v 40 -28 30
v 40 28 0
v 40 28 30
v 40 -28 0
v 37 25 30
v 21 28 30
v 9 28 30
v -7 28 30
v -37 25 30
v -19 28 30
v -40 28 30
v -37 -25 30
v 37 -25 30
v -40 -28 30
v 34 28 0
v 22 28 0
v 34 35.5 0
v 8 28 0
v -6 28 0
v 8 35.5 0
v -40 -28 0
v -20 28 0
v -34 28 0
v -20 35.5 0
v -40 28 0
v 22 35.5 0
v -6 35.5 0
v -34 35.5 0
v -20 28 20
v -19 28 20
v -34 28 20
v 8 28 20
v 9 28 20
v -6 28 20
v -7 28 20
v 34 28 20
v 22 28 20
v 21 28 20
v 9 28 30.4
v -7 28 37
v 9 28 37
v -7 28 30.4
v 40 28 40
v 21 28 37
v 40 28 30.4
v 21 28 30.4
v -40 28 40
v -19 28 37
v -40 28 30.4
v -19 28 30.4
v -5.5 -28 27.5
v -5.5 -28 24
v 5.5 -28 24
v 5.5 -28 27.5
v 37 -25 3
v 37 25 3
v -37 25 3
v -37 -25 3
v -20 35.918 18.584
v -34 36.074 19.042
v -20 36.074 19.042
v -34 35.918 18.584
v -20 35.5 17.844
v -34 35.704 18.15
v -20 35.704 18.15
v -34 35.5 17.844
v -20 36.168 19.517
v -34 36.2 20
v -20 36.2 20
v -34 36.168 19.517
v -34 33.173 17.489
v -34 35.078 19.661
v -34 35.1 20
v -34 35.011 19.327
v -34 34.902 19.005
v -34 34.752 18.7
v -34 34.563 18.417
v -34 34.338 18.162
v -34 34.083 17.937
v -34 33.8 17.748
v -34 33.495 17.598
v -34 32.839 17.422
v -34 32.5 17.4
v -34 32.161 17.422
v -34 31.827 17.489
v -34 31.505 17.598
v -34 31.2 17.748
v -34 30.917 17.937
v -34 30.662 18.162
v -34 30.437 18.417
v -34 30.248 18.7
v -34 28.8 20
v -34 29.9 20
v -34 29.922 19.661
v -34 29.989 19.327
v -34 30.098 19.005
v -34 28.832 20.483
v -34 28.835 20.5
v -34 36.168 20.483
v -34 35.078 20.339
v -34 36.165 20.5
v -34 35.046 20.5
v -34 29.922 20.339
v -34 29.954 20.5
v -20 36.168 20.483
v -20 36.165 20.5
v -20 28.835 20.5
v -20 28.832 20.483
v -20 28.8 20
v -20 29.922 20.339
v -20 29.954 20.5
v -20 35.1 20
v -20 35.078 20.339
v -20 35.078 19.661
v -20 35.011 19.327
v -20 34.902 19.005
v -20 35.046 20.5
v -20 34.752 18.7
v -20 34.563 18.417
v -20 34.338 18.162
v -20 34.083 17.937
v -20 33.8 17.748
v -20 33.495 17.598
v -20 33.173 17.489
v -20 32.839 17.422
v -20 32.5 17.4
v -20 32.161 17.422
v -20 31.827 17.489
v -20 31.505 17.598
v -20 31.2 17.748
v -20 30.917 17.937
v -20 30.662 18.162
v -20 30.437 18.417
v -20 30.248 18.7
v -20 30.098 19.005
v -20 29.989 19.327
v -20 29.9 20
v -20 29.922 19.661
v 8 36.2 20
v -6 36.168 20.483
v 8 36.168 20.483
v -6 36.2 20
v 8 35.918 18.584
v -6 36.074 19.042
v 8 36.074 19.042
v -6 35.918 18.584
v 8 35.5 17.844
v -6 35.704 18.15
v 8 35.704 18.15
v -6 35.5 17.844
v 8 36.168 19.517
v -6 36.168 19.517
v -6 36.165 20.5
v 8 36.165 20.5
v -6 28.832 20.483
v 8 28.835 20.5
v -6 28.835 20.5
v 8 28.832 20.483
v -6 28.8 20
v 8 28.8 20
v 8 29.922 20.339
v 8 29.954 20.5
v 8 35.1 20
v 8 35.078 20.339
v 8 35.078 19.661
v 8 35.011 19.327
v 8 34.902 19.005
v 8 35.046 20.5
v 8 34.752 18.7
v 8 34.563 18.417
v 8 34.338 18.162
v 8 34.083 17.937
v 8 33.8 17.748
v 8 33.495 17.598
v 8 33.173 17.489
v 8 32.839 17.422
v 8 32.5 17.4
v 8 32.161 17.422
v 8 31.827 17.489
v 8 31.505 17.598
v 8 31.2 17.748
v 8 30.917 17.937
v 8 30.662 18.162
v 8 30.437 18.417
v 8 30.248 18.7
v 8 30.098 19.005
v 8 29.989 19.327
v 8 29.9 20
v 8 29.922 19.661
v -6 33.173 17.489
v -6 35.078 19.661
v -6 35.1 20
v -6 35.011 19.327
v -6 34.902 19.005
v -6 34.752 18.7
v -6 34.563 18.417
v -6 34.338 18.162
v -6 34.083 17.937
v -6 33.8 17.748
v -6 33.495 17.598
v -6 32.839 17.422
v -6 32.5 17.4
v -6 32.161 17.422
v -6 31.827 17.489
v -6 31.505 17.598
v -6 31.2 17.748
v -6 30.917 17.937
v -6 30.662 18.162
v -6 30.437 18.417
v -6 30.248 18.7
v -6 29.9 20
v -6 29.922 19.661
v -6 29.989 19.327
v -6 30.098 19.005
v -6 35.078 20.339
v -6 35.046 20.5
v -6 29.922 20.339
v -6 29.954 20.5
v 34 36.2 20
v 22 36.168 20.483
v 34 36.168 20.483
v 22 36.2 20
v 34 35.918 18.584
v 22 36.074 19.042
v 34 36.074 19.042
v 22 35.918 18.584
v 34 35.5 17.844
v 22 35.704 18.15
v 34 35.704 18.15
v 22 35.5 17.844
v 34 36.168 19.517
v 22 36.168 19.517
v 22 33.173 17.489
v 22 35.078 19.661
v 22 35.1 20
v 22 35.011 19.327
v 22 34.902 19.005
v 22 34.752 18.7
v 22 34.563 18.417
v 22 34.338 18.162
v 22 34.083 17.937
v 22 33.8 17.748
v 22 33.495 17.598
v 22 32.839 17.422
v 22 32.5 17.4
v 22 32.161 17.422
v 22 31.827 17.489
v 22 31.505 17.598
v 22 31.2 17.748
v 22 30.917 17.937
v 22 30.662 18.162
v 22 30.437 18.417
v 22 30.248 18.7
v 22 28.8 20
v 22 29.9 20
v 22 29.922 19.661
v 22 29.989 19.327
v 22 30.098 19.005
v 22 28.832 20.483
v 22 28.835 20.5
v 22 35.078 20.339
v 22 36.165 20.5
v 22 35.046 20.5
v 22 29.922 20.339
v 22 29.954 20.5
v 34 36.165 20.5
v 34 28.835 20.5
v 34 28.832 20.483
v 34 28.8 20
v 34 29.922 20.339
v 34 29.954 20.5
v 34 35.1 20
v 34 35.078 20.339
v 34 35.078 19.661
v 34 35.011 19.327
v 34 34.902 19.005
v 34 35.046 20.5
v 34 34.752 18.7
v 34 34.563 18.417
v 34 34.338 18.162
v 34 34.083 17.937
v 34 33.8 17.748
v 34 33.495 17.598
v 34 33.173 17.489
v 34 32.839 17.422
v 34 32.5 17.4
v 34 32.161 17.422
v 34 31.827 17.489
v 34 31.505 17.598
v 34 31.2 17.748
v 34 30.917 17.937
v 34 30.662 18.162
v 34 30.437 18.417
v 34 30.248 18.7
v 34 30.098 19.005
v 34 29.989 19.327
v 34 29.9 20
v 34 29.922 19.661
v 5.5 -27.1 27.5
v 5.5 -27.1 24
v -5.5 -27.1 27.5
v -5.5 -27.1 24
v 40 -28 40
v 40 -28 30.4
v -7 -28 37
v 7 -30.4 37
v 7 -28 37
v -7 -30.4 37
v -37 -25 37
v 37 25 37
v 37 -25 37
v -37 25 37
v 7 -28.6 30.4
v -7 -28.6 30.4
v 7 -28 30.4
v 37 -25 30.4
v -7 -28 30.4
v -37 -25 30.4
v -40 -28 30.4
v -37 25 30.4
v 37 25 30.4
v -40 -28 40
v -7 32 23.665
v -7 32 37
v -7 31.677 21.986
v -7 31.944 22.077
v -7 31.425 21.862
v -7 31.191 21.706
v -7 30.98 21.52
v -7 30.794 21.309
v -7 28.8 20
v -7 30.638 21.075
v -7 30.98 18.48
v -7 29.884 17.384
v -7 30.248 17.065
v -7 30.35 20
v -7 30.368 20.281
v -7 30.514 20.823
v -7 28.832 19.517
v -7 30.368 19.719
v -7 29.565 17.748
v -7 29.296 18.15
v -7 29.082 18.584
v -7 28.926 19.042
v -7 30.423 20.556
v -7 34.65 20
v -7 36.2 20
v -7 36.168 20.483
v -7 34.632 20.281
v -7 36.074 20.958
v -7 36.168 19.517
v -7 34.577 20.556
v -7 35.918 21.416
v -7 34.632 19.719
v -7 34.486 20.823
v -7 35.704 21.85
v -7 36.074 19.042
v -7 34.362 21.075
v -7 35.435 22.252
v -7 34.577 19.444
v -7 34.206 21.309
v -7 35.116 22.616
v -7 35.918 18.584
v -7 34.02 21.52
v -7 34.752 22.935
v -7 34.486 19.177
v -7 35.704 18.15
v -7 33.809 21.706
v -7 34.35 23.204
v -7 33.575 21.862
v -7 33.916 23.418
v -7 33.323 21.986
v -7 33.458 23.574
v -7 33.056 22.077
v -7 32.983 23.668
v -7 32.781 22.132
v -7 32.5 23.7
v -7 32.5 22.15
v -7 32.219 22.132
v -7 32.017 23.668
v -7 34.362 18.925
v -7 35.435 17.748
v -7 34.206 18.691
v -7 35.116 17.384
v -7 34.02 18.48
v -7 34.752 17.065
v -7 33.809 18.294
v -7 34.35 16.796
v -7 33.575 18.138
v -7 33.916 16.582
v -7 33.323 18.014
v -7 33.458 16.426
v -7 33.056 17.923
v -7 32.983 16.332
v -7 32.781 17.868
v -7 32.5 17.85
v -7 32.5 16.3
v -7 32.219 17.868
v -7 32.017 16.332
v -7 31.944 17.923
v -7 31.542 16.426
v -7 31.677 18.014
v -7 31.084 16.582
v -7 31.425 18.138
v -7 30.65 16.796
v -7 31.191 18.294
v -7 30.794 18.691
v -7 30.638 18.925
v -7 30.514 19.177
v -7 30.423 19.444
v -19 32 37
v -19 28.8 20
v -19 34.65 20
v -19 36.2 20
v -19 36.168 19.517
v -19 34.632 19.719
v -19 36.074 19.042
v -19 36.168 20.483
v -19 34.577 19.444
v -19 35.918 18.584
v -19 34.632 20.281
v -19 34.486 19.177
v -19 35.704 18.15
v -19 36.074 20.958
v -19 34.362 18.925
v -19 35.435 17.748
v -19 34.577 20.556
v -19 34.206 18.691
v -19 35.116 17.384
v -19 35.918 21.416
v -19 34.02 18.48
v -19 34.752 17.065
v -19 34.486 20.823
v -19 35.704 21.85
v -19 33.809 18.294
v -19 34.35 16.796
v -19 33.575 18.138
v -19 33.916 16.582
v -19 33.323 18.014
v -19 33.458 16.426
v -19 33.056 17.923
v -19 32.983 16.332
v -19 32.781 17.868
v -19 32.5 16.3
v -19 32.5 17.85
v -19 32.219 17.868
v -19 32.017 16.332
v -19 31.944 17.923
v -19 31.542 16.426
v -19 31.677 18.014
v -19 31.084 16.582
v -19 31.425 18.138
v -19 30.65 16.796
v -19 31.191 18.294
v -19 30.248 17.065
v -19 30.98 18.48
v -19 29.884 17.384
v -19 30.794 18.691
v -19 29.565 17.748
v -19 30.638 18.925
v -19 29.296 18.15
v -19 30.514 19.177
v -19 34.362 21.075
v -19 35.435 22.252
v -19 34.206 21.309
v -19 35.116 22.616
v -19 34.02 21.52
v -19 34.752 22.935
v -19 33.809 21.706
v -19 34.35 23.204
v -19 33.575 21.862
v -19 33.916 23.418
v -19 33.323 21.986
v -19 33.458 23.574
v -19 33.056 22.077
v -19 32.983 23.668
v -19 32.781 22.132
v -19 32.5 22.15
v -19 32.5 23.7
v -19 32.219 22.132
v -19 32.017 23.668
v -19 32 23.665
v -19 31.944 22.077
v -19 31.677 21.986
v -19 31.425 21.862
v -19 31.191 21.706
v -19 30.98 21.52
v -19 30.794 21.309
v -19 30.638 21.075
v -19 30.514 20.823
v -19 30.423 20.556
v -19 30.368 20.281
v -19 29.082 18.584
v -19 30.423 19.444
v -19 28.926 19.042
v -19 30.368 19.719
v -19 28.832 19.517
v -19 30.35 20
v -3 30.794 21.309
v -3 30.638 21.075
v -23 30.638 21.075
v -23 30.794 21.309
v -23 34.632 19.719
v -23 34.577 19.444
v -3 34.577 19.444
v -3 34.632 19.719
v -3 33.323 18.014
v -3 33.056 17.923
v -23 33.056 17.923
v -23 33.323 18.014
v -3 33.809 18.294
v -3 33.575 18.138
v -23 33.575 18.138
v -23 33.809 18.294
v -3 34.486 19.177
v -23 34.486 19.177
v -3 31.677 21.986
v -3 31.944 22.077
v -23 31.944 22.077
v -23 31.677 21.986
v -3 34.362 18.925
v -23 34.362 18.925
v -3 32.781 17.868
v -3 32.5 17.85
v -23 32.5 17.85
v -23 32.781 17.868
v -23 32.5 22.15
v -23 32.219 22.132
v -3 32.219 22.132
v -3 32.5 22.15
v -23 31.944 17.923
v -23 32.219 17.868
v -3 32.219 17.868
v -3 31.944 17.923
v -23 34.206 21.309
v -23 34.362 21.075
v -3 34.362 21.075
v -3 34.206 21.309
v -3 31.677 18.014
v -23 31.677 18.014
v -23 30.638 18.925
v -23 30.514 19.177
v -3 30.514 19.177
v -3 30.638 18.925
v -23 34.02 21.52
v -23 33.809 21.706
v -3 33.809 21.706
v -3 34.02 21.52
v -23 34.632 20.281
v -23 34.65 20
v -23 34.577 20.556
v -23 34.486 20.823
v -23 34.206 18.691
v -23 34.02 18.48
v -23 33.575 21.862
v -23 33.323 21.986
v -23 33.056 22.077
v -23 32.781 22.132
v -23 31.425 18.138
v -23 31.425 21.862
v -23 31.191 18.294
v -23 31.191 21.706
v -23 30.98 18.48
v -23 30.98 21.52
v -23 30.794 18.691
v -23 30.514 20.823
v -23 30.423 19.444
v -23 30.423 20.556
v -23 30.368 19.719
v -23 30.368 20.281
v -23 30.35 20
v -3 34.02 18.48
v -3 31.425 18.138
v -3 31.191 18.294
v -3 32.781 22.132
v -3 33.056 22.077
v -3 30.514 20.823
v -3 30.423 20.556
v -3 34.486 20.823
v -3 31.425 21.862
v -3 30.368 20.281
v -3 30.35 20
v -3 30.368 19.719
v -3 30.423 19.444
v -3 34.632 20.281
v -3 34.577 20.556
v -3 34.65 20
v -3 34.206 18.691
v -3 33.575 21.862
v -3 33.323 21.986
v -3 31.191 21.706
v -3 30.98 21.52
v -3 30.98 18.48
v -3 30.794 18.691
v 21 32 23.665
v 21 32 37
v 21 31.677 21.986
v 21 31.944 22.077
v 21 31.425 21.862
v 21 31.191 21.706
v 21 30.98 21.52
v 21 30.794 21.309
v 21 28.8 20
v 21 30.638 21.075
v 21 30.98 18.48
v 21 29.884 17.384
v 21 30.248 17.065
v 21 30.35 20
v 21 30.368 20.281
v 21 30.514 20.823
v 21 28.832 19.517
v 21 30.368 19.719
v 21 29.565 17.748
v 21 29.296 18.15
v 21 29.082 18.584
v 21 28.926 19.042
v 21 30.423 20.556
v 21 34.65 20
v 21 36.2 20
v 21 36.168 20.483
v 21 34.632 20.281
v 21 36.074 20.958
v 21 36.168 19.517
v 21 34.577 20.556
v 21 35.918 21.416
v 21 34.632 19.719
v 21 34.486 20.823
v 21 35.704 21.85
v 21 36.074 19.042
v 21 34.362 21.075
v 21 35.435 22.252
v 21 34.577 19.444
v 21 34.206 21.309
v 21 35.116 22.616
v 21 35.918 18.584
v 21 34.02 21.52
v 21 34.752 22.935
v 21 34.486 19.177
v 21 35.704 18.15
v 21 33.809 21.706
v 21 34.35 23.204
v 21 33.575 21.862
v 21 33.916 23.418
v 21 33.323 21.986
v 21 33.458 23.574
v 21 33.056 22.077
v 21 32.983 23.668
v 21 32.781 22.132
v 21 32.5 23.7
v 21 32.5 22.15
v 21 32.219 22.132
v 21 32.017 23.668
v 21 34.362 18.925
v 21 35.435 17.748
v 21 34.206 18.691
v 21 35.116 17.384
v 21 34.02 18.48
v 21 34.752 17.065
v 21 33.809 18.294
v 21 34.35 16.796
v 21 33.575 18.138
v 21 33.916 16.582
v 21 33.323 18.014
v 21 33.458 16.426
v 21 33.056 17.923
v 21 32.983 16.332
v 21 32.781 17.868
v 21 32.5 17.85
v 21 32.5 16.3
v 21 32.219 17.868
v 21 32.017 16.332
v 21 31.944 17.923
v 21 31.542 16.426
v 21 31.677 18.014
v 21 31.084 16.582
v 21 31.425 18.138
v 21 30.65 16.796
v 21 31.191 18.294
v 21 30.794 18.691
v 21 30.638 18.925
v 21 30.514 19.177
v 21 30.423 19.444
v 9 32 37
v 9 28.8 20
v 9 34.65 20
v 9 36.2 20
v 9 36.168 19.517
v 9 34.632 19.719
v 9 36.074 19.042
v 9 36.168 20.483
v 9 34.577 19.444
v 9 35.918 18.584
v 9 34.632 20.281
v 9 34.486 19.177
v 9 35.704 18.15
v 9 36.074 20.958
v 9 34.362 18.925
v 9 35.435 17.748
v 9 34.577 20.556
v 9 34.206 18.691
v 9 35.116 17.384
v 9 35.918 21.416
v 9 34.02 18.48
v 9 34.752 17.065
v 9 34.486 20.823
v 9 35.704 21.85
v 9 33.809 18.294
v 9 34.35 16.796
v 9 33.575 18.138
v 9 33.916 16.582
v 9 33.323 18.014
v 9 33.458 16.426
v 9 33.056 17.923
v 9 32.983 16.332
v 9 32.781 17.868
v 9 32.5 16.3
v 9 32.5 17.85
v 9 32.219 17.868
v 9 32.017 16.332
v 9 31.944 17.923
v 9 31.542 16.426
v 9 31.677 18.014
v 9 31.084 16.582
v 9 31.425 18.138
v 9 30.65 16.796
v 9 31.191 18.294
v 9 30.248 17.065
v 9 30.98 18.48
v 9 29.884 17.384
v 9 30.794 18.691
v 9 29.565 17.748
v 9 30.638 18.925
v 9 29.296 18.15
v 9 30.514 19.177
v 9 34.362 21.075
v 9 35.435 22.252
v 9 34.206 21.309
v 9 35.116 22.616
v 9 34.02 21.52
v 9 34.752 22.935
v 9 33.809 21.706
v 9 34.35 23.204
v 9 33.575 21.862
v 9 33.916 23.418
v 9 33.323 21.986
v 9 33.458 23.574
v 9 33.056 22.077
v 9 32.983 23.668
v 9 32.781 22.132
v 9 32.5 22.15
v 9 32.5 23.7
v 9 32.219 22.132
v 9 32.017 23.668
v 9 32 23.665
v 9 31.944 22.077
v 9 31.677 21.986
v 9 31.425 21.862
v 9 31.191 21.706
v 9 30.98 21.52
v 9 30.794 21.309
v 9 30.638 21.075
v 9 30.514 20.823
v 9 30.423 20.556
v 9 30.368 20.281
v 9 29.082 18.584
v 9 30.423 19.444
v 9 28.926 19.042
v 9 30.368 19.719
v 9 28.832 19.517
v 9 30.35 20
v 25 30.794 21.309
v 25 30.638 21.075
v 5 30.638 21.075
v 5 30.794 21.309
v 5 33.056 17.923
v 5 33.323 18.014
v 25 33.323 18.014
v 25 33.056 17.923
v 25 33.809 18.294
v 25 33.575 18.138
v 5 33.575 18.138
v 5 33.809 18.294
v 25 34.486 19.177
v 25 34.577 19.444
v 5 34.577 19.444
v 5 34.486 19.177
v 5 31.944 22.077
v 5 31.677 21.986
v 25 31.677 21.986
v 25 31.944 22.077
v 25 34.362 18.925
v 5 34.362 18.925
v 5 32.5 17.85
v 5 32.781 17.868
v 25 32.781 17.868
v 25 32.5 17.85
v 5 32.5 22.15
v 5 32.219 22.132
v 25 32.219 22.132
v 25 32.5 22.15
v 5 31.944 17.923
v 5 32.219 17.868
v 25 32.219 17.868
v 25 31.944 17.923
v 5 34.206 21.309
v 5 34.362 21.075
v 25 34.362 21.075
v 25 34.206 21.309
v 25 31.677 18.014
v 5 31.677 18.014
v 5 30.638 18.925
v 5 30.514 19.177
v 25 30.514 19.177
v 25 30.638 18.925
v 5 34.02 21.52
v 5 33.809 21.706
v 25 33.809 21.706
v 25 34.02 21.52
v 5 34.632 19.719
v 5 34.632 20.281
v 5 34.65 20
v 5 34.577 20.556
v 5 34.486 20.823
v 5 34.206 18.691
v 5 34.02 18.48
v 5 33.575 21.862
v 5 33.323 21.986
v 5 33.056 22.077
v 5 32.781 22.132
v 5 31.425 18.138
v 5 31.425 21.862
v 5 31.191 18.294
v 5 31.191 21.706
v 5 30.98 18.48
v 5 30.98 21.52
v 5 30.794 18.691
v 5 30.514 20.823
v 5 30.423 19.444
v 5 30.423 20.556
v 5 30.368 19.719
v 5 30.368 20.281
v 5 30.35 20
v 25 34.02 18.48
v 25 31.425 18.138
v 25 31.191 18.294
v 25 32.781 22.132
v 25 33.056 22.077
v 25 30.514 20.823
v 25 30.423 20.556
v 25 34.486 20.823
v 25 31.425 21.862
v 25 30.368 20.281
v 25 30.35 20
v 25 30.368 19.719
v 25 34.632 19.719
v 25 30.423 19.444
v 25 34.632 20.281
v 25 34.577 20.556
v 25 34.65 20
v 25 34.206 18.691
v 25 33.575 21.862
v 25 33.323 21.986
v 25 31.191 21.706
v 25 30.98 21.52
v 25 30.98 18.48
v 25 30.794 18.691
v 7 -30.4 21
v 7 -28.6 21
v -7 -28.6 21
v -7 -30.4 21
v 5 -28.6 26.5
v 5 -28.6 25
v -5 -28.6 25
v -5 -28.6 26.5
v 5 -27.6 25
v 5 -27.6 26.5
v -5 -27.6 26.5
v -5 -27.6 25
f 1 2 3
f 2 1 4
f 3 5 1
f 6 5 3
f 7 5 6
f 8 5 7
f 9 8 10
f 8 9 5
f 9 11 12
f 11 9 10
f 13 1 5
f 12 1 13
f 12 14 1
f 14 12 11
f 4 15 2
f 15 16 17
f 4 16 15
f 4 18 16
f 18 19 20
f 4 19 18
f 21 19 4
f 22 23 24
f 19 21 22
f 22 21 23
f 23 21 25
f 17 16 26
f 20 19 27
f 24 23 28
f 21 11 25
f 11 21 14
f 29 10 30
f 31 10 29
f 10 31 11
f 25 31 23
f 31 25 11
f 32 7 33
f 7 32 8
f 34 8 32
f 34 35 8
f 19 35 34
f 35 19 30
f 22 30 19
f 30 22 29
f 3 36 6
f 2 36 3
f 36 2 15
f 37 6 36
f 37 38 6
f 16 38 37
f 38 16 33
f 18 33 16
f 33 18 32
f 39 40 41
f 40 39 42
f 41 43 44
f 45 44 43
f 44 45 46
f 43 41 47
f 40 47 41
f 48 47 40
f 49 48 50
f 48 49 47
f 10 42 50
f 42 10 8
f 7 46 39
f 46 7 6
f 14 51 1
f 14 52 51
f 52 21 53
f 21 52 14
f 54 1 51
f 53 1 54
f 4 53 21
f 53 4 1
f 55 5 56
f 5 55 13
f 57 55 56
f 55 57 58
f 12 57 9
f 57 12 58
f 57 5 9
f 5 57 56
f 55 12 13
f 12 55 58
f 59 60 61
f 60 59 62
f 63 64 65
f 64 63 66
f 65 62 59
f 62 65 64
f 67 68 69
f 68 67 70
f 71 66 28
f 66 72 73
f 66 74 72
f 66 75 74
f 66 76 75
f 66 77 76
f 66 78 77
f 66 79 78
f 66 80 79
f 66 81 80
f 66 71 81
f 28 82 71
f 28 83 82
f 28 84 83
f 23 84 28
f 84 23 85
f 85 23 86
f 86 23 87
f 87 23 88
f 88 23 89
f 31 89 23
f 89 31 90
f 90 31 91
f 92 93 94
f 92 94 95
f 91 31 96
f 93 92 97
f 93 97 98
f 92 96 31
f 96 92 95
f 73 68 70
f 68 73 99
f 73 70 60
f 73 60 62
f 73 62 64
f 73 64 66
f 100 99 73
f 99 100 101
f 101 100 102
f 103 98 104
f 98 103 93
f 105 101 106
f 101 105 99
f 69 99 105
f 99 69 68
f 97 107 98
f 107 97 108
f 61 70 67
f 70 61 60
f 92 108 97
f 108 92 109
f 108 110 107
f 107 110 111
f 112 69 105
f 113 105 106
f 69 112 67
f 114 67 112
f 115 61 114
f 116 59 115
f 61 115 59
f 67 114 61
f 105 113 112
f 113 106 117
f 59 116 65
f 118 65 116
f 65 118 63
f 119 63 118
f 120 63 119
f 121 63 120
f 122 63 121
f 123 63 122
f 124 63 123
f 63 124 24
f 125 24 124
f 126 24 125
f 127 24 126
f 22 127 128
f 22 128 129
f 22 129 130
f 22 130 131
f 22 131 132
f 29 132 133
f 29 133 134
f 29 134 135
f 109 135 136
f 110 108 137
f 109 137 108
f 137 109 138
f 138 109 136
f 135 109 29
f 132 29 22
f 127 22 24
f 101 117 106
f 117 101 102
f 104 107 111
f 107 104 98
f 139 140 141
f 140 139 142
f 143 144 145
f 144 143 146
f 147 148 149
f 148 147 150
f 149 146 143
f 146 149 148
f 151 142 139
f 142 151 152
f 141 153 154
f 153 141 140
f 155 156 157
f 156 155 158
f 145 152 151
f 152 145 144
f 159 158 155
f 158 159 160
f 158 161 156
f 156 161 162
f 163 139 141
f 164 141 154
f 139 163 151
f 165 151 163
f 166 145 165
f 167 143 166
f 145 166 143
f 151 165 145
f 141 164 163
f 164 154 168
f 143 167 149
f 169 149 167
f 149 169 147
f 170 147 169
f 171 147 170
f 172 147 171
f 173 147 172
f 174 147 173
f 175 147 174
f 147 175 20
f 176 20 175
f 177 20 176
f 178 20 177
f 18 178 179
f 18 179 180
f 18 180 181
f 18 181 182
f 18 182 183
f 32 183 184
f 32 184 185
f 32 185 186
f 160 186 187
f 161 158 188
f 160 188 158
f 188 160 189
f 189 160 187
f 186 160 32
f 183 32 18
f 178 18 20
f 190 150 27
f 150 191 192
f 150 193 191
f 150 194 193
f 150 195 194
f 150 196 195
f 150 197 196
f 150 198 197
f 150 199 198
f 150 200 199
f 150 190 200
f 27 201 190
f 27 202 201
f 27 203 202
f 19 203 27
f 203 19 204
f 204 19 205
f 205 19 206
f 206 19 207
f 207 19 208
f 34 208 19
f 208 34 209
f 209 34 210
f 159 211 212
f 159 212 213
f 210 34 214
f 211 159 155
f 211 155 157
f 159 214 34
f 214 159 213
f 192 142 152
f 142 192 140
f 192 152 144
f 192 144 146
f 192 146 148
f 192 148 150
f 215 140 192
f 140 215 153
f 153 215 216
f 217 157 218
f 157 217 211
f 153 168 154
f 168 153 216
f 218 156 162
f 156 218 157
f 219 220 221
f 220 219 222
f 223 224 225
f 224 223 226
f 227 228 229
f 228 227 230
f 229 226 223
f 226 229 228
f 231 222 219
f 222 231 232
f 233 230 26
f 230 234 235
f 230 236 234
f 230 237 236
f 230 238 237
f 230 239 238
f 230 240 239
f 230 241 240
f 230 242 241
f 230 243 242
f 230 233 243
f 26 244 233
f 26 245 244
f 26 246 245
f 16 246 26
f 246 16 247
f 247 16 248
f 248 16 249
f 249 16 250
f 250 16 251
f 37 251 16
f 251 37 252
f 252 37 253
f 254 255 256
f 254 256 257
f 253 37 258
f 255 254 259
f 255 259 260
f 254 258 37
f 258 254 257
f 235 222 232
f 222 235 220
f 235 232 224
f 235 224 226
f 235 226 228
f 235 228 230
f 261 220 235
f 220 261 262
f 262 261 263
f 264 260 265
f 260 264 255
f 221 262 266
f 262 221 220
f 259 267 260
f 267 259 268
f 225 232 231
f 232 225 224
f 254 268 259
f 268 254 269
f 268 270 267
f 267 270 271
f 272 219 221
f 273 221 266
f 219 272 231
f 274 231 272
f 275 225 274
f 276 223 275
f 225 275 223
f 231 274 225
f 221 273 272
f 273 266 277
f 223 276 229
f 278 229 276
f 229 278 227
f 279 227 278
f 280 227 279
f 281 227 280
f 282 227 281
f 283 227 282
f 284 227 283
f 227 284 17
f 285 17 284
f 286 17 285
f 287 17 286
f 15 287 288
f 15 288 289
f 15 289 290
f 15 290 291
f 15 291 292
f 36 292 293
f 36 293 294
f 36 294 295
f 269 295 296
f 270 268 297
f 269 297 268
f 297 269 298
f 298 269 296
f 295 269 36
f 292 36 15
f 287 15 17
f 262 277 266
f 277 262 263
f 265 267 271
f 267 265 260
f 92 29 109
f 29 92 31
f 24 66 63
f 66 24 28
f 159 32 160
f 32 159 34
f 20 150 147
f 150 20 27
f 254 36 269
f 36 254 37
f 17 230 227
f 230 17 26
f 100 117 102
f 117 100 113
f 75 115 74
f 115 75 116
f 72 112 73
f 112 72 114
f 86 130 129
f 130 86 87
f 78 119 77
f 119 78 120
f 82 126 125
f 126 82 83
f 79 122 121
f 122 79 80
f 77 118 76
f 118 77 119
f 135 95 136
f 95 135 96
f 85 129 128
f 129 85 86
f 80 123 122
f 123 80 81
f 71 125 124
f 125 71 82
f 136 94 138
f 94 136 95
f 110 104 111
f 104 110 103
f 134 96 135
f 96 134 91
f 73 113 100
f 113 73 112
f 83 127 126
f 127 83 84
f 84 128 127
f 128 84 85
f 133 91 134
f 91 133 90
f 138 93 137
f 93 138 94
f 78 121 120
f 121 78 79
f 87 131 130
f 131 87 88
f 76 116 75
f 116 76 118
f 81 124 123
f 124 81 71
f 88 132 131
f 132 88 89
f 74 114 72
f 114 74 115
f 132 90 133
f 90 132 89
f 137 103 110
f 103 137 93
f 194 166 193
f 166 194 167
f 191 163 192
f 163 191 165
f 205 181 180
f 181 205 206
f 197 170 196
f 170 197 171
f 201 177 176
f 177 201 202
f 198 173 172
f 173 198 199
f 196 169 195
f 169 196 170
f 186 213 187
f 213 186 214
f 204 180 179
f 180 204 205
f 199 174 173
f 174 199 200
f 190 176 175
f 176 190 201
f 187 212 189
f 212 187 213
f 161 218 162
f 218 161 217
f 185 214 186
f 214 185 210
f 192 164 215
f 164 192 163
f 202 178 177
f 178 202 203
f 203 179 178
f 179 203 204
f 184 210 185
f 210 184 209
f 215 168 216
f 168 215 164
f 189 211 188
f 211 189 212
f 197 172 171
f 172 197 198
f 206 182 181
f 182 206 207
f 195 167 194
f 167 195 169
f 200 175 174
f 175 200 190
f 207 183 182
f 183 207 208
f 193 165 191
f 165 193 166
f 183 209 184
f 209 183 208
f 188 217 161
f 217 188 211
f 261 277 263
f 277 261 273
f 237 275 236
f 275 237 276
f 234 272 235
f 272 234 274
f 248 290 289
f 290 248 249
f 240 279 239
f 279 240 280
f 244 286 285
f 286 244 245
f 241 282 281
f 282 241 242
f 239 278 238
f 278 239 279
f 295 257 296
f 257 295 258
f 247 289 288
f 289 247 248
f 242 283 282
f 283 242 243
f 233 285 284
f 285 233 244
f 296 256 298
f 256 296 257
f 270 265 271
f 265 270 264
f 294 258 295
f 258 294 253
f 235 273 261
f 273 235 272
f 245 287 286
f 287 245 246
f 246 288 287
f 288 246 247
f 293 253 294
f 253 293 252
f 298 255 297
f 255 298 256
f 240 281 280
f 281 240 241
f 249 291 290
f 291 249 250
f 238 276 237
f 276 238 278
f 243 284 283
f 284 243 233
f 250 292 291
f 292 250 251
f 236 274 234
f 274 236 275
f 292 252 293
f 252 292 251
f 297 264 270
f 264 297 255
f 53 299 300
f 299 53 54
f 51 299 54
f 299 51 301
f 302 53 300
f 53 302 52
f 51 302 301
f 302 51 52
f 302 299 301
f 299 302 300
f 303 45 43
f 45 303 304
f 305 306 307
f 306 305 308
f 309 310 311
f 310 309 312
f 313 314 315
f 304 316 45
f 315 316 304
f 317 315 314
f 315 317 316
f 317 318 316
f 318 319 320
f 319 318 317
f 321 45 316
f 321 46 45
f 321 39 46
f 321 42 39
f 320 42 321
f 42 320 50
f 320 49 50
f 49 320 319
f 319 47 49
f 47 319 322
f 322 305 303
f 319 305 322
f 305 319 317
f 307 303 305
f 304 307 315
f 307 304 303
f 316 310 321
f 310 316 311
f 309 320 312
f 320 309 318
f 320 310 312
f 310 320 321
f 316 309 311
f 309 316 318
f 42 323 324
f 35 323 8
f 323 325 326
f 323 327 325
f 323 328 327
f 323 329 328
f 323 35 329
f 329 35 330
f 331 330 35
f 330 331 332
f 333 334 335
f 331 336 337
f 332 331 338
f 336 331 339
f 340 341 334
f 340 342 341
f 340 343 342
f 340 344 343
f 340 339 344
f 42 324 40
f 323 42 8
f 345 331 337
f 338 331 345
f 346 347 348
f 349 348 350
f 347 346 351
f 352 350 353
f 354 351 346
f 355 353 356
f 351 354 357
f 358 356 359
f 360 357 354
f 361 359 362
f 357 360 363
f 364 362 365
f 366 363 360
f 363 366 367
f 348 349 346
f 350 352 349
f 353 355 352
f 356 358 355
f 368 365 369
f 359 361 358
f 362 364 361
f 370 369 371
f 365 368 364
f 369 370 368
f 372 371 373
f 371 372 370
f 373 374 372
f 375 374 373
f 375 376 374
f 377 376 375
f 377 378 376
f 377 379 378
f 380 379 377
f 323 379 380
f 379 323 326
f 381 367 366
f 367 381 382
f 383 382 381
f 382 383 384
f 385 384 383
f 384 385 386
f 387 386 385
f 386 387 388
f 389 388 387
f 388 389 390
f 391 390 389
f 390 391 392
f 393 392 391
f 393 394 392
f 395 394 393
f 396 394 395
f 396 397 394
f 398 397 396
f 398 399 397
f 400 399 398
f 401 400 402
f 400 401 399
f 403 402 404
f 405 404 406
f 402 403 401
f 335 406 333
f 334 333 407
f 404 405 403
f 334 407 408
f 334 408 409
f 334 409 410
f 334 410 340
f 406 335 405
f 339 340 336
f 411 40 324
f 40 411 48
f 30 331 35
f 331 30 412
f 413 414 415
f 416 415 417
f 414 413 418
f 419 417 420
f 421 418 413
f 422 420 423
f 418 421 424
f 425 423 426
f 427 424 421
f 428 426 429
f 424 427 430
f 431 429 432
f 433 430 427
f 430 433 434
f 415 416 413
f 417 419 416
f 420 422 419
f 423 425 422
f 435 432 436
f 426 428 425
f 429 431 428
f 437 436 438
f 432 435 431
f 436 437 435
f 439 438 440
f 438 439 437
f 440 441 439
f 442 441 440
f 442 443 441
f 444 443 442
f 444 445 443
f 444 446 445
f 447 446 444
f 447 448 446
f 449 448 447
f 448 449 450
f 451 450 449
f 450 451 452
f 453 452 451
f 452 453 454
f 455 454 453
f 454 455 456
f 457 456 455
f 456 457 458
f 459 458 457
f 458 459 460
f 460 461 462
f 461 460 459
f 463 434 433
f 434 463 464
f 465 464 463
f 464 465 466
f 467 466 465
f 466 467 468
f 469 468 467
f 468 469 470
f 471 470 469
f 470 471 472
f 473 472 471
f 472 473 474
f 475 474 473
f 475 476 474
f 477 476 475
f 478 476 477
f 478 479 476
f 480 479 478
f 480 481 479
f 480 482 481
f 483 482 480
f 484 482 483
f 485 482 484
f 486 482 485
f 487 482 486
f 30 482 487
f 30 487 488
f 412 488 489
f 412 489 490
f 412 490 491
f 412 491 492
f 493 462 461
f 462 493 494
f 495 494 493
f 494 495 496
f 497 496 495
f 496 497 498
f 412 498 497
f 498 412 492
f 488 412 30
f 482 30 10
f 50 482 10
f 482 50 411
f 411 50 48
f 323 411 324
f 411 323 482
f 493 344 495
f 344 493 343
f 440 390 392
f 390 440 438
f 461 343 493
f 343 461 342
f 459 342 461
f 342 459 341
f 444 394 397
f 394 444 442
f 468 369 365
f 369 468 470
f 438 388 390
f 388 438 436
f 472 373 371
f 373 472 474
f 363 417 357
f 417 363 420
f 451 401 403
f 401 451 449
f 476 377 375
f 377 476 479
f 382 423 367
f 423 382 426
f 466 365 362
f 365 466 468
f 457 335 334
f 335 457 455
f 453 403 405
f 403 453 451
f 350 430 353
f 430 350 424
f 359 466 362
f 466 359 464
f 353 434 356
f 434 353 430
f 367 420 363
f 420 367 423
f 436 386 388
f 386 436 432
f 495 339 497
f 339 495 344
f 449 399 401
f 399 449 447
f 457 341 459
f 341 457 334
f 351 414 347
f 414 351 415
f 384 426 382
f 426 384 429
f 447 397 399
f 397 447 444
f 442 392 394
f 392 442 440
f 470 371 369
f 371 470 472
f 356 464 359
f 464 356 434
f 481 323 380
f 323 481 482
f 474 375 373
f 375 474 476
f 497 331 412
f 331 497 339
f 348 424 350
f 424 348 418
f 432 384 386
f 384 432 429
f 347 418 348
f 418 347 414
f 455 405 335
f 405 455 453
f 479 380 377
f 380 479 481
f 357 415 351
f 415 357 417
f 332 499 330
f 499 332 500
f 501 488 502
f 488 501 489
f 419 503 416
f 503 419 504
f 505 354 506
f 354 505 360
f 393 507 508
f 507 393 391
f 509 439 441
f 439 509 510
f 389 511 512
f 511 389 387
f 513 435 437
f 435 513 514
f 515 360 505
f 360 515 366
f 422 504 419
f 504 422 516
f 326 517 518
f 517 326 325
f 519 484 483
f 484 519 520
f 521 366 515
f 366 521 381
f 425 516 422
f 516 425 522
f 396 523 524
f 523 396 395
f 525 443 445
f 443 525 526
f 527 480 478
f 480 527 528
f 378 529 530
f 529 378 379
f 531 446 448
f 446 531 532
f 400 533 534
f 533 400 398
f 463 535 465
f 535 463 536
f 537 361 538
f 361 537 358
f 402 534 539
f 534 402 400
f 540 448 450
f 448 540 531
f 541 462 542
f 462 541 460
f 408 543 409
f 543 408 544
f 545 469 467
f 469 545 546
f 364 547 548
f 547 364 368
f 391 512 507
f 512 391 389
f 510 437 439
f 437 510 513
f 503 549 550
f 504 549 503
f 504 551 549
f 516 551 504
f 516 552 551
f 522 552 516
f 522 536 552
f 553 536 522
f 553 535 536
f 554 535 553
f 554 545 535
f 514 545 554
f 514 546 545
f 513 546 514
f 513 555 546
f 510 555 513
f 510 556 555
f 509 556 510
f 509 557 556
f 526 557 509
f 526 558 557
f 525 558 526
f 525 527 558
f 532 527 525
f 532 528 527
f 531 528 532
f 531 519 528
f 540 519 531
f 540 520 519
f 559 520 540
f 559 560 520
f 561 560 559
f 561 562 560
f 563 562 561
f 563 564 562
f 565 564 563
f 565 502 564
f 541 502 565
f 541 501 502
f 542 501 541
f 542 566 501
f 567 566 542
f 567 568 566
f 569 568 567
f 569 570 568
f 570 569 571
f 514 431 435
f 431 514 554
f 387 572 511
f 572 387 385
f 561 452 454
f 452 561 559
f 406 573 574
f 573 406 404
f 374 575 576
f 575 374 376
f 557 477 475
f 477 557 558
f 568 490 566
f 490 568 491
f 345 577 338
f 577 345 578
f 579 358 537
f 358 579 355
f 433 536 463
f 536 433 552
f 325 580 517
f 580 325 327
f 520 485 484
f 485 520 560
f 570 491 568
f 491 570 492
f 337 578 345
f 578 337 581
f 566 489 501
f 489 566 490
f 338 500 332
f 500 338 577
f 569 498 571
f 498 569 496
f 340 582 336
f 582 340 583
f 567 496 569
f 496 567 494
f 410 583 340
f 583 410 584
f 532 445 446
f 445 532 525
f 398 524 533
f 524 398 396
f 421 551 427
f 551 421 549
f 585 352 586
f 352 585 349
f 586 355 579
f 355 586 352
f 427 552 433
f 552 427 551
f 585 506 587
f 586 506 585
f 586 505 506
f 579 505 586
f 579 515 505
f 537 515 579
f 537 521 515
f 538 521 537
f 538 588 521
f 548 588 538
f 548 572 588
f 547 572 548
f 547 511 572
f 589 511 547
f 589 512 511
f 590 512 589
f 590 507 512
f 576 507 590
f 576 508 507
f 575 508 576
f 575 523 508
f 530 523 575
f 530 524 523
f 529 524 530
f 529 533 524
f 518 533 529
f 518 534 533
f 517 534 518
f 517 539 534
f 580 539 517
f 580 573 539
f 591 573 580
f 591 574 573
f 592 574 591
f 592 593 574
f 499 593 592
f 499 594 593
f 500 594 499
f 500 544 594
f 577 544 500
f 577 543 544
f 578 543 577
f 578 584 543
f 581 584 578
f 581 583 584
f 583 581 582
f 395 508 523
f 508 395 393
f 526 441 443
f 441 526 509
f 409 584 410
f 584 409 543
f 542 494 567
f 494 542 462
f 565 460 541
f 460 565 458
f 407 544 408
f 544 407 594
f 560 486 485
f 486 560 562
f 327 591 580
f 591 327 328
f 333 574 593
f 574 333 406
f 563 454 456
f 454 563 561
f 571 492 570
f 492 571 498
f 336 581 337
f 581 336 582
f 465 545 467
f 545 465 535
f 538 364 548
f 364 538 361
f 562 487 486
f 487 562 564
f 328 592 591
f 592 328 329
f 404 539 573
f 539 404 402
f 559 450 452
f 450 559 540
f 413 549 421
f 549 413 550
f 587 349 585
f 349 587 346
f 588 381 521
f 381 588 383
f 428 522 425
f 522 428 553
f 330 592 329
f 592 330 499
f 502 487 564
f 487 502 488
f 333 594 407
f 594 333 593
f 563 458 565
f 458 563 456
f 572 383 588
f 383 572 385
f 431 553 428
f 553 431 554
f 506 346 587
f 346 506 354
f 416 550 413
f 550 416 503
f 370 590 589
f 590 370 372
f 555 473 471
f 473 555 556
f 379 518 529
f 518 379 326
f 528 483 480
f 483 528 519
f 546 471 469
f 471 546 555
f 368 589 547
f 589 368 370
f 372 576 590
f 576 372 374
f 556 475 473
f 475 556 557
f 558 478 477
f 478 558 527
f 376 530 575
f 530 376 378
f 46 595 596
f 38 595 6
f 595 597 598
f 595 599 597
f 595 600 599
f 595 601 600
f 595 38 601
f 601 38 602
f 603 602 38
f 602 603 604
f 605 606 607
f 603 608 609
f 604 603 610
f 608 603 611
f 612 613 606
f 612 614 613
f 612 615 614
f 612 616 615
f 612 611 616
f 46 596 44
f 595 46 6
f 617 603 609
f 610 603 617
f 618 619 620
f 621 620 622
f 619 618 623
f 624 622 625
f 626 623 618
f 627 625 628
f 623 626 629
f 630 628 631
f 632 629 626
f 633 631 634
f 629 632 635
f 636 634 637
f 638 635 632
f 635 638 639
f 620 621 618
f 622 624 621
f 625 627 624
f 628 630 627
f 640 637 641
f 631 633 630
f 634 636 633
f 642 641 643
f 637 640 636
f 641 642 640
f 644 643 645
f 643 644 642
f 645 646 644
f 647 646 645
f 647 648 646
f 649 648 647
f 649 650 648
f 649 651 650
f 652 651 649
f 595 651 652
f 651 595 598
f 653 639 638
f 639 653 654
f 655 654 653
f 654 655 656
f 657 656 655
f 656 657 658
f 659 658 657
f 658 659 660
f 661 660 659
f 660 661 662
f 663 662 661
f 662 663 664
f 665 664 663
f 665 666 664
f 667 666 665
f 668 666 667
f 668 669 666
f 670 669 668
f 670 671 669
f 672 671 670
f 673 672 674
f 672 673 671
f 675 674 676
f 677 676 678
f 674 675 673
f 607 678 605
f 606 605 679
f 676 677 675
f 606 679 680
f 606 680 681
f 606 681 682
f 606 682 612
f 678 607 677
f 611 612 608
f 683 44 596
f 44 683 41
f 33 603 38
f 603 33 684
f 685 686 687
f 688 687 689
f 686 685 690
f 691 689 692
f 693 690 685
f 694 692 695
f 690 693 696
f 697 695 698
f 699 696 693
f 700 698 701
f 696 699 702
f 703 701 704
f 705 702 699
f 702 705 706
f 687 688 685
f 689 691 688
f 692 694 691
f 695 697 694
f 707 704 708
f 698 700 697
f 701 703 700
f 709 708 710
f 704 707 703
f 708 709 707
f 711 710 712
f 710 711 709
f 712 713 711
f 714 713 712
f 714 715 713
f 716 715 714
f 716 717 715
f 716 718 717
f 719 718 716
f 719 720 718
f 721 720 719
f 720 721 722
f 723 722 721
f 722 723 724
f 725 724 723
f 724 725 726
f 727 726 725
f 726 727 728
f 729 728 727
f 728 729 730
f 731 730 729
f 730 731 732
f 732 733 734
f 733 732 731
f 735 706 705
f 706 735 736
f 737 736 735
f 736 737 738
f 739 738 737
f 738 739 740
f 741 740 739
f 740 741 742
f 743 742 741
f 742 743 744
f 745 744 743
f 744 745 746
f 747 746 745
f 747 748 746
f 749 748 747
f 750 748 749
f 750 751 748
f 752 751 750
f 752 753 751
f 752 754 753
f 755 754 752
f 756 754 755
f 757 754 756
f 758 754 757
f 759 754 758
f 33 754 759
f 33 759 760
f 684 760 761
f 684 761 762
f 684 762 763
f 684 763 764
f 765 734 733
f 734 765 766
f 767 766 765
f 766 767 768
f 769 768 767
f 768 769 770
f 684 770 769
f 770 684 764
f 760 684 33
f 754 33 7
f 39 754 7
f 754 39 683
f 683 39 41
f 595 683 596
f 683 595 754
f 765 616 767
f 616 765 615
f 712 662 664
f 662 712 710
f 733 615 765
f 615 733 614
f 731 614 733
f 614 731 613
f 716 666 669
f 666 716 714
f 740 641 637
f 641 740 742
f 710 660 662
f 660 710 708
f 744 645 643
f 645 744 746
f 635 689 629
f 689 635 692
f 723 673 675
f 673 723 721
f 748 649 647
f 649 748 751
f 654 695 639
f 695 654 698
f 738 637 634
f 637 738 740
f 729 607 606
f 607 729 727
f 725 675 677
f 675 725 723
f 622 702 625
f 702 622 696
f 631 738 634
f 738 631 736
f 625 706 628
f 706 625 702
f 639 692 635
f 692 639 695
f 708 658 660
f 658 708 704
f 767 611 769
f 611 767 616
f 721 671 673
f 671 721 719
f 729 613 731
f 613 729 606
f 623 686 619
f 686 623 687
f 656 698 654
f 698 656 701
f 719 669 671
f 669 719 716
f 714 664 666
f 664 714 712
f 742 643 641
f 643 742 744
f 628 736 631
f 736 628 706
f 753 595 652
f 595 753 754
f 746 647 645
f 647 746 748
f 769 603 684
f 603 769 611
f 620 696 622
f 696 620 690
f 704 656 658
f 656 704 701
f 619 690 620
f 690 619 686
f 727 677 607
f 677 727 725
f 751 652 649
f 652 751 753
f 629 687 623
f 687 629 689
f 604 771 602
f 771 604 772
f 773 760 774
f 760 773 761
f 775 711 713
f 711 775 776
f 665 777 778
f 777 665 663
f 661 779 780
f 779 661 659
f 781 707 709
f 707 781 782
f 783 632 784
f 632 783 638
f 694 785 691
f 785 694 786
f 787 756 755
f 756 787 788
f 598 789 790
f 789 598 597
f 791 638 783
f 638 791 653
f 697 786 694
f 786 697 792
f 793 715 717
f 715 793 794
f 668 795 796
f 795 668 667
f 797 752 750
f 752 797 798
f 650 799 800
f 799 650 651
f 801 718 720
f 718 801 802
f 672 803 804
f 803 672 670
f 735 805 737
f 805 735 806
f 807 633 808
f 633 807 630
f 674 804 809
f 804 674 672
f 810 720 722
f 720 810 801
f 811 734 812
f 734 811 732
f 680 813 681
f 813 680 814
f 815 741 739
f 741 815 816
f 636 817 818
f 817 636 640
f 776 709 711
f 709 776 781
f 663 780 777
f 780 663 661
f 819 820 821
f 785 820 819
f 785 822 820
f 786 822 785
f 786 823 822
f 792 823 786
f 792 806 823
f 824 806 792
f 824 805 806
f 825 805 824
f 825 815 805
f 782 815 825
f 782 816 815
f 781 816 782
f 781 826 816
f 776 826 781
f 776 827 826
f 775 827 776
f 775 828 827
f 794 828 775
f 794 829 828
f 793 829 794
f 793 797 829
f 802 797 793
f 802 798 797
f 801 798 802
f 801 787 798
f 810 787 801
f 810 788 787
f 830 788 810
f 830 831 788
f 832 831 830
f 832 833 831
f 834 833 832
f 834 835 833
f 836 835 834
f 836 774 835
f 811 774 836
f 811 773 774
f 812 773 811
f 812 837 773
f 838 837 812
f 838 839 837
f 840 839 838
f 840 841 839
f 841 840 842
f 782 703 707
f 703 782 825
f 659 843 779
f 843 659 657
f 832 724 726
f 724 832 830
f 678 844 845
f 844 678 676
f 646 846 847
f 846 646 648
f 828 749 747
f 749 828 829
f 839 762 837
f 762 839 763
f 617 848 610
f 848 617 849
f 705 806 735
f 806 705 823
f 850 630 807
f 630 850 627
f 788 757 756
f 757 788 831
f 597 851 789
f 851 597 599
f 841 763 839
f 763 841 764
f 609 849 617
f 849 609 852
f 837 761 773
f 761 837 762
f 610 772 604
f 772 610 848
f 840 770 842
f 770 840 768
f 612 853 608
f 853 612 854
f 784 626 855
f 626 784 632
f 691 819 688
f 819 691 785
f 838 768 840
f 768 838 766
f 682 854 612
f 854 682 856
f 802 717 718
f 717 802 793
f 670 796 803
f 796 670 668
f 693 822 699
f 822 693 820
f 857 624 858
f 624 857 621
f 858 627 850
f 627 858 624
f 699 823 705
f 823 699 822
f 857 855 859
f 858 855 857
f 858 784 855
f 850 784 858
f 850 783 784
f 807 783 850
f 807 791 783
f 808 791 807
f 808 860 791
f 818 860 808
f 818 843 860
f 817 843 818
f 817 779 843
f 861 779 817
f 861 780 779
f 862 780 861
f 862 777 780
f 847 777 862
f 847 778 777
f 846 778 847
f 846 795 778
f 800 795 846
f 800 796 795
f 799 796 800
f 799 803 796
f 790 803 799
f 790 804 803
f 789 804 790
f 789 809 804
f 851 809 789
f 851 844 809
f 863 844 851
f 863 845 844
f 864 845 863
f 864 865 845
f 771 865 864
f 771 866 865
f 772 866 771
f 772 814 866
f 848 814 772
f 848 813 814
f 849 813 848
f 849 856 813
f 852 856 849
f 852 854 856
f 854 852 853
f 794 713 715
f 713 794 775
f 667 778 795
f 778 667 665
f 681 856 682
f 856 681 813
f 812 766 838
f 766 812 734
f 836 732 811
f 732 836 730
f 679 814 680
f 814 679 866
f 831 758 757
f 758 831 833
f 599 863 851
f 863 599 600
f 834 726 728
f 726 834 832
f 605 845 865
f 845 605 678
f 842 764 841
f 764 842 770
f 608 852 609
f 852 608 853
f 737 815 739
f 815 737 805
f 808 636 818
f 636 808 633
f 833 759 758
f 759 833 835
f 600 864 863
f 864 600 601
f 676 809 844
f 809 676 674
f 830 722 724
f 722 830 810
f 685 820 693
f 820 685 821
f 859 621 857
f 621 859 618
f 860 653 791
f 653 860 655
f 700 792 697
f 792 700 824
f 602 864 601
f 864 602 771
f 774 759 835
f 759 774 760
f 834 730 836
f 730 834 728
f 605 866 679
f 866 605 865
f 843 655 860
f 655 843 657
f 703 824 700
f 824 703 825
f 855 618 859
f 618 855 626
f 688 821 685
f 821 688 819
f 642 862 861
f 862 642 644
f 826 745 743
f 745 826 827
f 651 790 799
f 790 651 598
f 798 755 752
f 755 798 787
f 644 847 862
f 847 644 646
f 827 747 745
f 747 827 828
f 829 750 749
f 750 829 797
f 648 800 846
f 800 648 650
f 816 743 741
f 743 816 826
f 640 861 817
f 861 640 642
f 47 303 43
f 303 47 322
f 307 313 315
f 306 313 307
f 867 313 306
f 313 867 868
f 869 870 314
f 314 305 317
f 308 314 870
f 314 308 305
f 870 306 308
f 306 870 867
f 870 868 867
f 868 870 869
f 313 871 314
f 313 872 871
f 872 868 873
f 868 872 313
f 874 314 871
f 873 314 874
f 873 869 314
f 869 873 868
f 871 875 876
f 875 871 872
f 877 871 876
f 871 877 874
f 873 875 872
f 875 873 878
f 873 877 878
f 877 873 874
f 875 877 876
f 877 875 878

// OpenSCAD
// Print-in-place hinged box, 80 x ~65 x 40 mm closed (80 x 56 body + hinge/catch)
// Parts: base, lid, pin.  Assembly = closed box.  Print pose = lid open 180 deg,
// lying flat behind the base, both trays opening up, pin captive in the knuckles.
part = "assembly"; // [assembly, base, lid]
cadverify_only = "";
module instance(name, p, unit = 1) {
    echo(cadverify_instance = [name, p, unit]);
    if (cadverify_only == "" || cadverify_only == name) children();
}
$fn = 48;
// ---- dimensions (assembly / closed coordinates) ----
W = 80; D = 56; base_h = 30; lid_top = 40; wall = 3;
ax_y = 32.5; ax_z = 20;            // hinge axis, 0.8 mm behind rear wall (y=28)
r_out = 3.7; r_bore = 2.6; r_stub = 2.15; // lid pin stubs, 0.45 radial clearance in base bores
base_segs = [[-34, -20], [-6, 8], [22, 34]];
lid_segs  = [[-19, -7], [9, 21]];
module cylx(x0, len, r) translate([x0, 0, 0]) rotate([0, 90, 0]) cylinder(h = len, r = r);
module base_closed() {
    difference() {
        union() {
            difference() {
                translate([-40, -28, 0]) cube([80, 56, 30]);
                translate([-37, -25, 3]) cube([74, 50, 30]);
            }
            for (s = base_segs) {
                translate([s[0], 27, 0]) cube([s[1] - s[0], 8.5, 20]); // pillar to bed, supports knuckle
                intersection() { // open-top cradle (lower knuckle): lid stub drops in, no enclosed bore
                    translate([0, ax_y, ax_z]) cylx(s[0], s[1] - s[0], r_out);
                    translate([s[0], ax_y - 4, ax_z - 4]) cube([s[1] - s[0], 8, 4.5]);
                }
            }
        }
        for (s = base_segs) translate([0, ax_y, ax_z]) cylx(s[0] - 1, s[1] - s[0] + 2, r_bore);
        translate([-5.5, -29, 24]) cube([11, 1.9, 3.5]); // catch pocket, front wall
    }
}
module lid_closed() {
    union() {
            translate([-40, -28, 37]) cube([80, 56, 3]);               // top panel
            difference() {                                              // skirt
                translate([-40, -28, 30.4]) cube([80, 56, 6.6]);
                translate([-37, -25, 29]) cube([74, 50, 8]);
            }
            for (s = lid_segs) {
                translate([s[0], 28, 20]) cube([s[1] - s[0], 4, 17]);  // hinge strap
                translate([0, ax_y, ax_z]) cylx(s[0], s[1] - s[0], r_out);
                translate([0, ax_y, ax_z]) cylx(s[0] - 4, s[1] - s[0] + 8, r_stub); // integral pin stubs into base cradles
            }
            translate([-7, -30.4, 30.4]) cube([14, 2.4, 6.6]);          // catch spacer
            translate([-7, -30.4, 21]) cube([14, 1.8, 12]);             // catch tab
            translate([-5, -28.6, 25.0]) cube([10, 1.0, 1.5]);          // catch bump (smaller, less snap penetration)
    }
}
module lid_print() translate([0, -28.8, 0]) translate([0, ax_y, ax_z])
    rotate([180, 0, 0]) translate([0, -ax_y, -ax_z]) lid_closed();
// ---- specs (exported-part coordinates) ----
if (part == "base") echo(cadverify_spec = [
    ["bounds", [[-40, -28, 0], [40, 36.2, 30]]], ["bodies", 1], ["through_holes", 0],
    ["support_faces", [["bed", "-z", 4000]]],
    ["overhangs_allowed", [["hinge cradle groove, pillars rise to the knuckles from the bed", [[-40, 26, 14], [40, 37, 24]]],
                            ["catch pocket ceiling", [[-8, -29, 23], [8, -26, 29]]]]],
    ["copies", 1],
    ["details", [
        ["floor", "material", [[-37, -25, 0], [37, 25, 3]], 0.95],
        ["cavity", "void", [[-36, -24, 10], [36, 24, 29]], 0.98],
        ["base_knuckle", "material", [[-30, 34.8, 19], [-24, 35.8, 20]], 0.7],
        ["cradle_groove", "void", [[-30, 31.8, 19.3], [-24, 33.2, 20.7]], 0.95],
        ["front_wall", "thickness", [0, -35, 15], [0, 1, 0], 3]
    ]]]);
if (part == "lid") echo(cadverify_spec = [
    ["bounds", [[-40, 0, 0], [40, 66.6, 23.7]]], ["bodies", 1], ["through_holes", 0],
    ["support_faces", [["bed", "-z", 4000]]],
    ["overhangs_allowed", [["strap and hinge knuckle undersides, within 5 mm of the panel edge and straps", [[-40, 0, 2], [40, 10, 24]]],
                            ["catch tab and bump undersides", [[-8, 62, 2], [8, 67, 20]]]]],
    ["copies", 1],
    ["details", [
        ["panel", "material", [[-37, 10, 0], [37, 60, 3]], 0.95],
        ["tray_cavity", "void", [[-35, 14, 3.5], [35, 57, 9]], 0.95],
        ["strap", "material", [[10, 5, 10], [20, 7.5, 18]], 0.85],
        ["panel_thickness", "thickness", [0, 35, -5], [0, 0, 1], 3],
        ["catch_tab", "view", [[-8, 64, 6], [8, 67, 20]]]
    ]]]);
if (part == "assembly") echo(cadverify_spec = [
    ["bounds", [[-40, -30.4, 0], [40, 36.2, 40]]],
    ["support_faces", [["bed", "-z", 4000]]],
    ["allowed_interferences", []],
    ["motions", [["lid_open", ["lid"], "rotate", [0, 32.5, 20], [-1, 0, 0], [0, 180],
        ["flex", [["lid", "base", 1.0, "catch bump snaps out of its pocket and tab flexes"]]]]]],
    ["assembly_order", [
        [["base"], [0, 0, 0]],
        [["lid"], [0, 1, -1]]
    ]],
    ["print_in_place", 0.4],
    ["print_pose", [["lid_open", 180]]],
    ["overhangs_allowed", [["hinge cradles, knuckles, straps and pin stubs, supported by pillars, panel edge and straps within 5 mm", [[-40, 27, 2], [40, 38, 26]]],
                            ["catch tab, spacer and bump in print pose", [[-8, 88, 2], [8, 96, 20]]],
                            ["catch pocket ceiling", [[-8, -31, 20], [8, -26, 29]]]]]
]);
// ---- output ----
if (part == "base") base_closed();
else if (part == "lid") lid_print();
else if (part == "assembly") {
    instance("base", "base") base_closed();
    instance("lid", "lid") lid_closed();
}
